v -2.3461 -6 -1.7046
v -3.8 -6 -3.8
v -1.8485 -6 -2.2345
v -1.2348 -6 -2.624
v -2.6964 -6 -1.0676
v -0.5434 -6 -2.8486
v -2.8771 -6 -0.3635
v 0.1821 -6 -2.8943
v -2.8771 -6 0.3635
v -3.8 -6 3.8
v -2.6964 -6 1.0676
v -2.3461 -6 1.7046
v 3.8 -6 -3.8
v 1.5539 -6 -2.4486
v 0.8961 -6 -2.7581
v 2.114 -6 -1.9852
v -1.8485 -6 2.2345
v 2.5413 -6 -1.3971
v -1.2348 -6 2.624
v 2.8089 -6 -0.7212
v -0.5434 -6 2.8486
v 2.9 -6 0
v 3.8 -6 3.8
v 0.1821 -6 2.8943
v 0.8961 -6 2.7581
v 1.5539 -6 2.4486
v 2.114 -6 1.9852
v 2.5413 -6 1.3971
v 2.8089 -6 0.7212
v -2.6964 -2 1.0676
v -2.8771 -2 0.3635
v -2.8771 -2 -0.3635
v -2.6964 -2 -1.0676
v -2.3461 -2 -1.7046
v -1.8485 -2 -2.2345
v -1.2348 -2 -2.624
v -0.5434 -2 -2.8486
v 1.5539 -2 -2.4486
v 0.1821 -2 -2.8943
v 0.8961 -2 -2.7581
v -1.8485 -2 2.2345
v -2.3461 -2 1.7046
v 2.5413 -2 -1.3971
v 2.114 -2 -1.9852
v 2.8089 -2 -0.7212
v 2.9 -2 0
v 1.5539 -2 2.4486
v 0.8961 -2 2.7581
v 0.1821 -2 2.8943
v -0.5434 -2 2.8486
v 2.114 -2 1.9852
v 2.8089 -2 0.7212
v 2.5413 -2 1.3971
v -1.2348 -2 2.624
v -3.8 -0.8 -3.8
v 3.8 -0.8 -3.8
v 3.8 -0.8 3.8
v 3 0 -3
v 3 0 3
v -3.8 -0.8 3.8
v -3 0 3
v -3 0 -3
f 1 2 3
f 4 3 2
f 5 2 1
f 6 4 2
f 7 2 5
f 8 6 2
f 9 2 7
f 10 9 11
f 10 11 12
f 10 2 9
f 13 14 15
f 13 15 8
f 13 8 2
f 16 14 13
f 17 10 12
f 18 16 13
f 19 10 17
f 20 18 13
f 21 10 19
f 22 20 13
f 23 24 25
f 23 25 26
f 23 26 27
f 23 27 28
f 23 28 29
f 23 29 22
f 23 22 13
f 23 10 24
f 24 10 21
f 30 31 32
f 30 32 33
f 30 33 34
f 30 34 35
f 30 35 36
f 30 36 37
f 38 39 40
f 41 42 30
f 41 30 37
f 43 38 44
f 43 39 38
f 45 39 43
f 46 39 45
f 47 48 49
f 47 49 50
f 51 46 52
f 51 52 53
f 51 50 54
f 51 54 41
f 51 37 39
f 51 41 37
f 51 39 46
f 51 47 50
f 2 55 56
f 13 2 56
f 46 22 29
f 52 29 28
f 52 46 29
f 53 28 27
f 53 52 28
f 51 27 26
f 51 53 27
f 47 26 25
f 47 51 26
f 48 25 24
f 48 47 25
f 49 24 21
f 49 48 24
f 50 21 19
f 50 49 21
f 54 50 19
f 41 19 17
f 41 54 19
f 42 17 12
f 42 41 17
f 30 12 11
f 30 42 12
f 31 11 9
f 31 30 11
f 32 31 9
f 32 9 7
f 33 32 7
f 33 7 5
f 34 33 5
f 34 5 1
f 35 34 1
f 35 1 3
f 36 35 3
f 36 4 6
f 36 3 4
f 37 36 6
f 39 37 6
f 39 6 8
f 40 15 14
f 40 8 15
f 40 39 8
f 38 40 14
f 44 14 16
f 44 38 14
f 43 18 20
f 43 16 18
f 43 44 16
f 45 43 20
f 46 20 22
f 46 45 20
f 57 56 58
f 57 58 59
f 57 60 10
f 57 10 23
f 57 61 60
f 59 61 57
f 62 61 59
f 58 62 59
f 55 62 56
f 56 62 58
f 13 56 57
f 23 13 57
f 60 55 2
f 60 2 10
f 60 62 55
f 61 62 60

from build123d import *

# Parameters (mm, degrees)
SKETCH020_W       = 7.6
SKETCH020_H       = 7.6
PAD003_DEPTH      = 6
SKETCH022_R       = 2.8
PAD004_DEPTH      = 3
CYLINDER001_R     = 2.9
CYLINDER001_DEPTH = 10
CHAMFER_SIZE      = 0.8


with BuildPart() as part:
    # Sketch020 → Pad003 (new body)
    with BuildSketch(Plane.XZ):
        Rectangle(SKETCH020_W, SKETCH020_H)
    extrude(amount=PAD003_DEPTH)

    # Sketch022 → Pad004 (join)
    with BuildSketch(Plane.XZ.offset(6)):
        Circle(SKETCH022_R)
    extrude(amount=PAD004_DEPTH)

    # Cylinder001 → Cylinder001 (cut)
    with BuildSketch(Plane.XZ.offset(2)):
        Circle(CYLINDER001_R)
    extrude(amount=CYLINDER001_DEPTH, mode=Mode.SUBTRACT)

    # Chamfer
    chamfer_edges = [part.edges().sort_by_distance(p)[0] for p in [
        (3.8, 0, 0),
        (0, 0, -3.8),
        (0, 0, 3.8),
        (-3.8, 0, 0),
    ]]
    chamfer(chamfer_edges, length=CHAMFER_SIZE)


solid = part.part
